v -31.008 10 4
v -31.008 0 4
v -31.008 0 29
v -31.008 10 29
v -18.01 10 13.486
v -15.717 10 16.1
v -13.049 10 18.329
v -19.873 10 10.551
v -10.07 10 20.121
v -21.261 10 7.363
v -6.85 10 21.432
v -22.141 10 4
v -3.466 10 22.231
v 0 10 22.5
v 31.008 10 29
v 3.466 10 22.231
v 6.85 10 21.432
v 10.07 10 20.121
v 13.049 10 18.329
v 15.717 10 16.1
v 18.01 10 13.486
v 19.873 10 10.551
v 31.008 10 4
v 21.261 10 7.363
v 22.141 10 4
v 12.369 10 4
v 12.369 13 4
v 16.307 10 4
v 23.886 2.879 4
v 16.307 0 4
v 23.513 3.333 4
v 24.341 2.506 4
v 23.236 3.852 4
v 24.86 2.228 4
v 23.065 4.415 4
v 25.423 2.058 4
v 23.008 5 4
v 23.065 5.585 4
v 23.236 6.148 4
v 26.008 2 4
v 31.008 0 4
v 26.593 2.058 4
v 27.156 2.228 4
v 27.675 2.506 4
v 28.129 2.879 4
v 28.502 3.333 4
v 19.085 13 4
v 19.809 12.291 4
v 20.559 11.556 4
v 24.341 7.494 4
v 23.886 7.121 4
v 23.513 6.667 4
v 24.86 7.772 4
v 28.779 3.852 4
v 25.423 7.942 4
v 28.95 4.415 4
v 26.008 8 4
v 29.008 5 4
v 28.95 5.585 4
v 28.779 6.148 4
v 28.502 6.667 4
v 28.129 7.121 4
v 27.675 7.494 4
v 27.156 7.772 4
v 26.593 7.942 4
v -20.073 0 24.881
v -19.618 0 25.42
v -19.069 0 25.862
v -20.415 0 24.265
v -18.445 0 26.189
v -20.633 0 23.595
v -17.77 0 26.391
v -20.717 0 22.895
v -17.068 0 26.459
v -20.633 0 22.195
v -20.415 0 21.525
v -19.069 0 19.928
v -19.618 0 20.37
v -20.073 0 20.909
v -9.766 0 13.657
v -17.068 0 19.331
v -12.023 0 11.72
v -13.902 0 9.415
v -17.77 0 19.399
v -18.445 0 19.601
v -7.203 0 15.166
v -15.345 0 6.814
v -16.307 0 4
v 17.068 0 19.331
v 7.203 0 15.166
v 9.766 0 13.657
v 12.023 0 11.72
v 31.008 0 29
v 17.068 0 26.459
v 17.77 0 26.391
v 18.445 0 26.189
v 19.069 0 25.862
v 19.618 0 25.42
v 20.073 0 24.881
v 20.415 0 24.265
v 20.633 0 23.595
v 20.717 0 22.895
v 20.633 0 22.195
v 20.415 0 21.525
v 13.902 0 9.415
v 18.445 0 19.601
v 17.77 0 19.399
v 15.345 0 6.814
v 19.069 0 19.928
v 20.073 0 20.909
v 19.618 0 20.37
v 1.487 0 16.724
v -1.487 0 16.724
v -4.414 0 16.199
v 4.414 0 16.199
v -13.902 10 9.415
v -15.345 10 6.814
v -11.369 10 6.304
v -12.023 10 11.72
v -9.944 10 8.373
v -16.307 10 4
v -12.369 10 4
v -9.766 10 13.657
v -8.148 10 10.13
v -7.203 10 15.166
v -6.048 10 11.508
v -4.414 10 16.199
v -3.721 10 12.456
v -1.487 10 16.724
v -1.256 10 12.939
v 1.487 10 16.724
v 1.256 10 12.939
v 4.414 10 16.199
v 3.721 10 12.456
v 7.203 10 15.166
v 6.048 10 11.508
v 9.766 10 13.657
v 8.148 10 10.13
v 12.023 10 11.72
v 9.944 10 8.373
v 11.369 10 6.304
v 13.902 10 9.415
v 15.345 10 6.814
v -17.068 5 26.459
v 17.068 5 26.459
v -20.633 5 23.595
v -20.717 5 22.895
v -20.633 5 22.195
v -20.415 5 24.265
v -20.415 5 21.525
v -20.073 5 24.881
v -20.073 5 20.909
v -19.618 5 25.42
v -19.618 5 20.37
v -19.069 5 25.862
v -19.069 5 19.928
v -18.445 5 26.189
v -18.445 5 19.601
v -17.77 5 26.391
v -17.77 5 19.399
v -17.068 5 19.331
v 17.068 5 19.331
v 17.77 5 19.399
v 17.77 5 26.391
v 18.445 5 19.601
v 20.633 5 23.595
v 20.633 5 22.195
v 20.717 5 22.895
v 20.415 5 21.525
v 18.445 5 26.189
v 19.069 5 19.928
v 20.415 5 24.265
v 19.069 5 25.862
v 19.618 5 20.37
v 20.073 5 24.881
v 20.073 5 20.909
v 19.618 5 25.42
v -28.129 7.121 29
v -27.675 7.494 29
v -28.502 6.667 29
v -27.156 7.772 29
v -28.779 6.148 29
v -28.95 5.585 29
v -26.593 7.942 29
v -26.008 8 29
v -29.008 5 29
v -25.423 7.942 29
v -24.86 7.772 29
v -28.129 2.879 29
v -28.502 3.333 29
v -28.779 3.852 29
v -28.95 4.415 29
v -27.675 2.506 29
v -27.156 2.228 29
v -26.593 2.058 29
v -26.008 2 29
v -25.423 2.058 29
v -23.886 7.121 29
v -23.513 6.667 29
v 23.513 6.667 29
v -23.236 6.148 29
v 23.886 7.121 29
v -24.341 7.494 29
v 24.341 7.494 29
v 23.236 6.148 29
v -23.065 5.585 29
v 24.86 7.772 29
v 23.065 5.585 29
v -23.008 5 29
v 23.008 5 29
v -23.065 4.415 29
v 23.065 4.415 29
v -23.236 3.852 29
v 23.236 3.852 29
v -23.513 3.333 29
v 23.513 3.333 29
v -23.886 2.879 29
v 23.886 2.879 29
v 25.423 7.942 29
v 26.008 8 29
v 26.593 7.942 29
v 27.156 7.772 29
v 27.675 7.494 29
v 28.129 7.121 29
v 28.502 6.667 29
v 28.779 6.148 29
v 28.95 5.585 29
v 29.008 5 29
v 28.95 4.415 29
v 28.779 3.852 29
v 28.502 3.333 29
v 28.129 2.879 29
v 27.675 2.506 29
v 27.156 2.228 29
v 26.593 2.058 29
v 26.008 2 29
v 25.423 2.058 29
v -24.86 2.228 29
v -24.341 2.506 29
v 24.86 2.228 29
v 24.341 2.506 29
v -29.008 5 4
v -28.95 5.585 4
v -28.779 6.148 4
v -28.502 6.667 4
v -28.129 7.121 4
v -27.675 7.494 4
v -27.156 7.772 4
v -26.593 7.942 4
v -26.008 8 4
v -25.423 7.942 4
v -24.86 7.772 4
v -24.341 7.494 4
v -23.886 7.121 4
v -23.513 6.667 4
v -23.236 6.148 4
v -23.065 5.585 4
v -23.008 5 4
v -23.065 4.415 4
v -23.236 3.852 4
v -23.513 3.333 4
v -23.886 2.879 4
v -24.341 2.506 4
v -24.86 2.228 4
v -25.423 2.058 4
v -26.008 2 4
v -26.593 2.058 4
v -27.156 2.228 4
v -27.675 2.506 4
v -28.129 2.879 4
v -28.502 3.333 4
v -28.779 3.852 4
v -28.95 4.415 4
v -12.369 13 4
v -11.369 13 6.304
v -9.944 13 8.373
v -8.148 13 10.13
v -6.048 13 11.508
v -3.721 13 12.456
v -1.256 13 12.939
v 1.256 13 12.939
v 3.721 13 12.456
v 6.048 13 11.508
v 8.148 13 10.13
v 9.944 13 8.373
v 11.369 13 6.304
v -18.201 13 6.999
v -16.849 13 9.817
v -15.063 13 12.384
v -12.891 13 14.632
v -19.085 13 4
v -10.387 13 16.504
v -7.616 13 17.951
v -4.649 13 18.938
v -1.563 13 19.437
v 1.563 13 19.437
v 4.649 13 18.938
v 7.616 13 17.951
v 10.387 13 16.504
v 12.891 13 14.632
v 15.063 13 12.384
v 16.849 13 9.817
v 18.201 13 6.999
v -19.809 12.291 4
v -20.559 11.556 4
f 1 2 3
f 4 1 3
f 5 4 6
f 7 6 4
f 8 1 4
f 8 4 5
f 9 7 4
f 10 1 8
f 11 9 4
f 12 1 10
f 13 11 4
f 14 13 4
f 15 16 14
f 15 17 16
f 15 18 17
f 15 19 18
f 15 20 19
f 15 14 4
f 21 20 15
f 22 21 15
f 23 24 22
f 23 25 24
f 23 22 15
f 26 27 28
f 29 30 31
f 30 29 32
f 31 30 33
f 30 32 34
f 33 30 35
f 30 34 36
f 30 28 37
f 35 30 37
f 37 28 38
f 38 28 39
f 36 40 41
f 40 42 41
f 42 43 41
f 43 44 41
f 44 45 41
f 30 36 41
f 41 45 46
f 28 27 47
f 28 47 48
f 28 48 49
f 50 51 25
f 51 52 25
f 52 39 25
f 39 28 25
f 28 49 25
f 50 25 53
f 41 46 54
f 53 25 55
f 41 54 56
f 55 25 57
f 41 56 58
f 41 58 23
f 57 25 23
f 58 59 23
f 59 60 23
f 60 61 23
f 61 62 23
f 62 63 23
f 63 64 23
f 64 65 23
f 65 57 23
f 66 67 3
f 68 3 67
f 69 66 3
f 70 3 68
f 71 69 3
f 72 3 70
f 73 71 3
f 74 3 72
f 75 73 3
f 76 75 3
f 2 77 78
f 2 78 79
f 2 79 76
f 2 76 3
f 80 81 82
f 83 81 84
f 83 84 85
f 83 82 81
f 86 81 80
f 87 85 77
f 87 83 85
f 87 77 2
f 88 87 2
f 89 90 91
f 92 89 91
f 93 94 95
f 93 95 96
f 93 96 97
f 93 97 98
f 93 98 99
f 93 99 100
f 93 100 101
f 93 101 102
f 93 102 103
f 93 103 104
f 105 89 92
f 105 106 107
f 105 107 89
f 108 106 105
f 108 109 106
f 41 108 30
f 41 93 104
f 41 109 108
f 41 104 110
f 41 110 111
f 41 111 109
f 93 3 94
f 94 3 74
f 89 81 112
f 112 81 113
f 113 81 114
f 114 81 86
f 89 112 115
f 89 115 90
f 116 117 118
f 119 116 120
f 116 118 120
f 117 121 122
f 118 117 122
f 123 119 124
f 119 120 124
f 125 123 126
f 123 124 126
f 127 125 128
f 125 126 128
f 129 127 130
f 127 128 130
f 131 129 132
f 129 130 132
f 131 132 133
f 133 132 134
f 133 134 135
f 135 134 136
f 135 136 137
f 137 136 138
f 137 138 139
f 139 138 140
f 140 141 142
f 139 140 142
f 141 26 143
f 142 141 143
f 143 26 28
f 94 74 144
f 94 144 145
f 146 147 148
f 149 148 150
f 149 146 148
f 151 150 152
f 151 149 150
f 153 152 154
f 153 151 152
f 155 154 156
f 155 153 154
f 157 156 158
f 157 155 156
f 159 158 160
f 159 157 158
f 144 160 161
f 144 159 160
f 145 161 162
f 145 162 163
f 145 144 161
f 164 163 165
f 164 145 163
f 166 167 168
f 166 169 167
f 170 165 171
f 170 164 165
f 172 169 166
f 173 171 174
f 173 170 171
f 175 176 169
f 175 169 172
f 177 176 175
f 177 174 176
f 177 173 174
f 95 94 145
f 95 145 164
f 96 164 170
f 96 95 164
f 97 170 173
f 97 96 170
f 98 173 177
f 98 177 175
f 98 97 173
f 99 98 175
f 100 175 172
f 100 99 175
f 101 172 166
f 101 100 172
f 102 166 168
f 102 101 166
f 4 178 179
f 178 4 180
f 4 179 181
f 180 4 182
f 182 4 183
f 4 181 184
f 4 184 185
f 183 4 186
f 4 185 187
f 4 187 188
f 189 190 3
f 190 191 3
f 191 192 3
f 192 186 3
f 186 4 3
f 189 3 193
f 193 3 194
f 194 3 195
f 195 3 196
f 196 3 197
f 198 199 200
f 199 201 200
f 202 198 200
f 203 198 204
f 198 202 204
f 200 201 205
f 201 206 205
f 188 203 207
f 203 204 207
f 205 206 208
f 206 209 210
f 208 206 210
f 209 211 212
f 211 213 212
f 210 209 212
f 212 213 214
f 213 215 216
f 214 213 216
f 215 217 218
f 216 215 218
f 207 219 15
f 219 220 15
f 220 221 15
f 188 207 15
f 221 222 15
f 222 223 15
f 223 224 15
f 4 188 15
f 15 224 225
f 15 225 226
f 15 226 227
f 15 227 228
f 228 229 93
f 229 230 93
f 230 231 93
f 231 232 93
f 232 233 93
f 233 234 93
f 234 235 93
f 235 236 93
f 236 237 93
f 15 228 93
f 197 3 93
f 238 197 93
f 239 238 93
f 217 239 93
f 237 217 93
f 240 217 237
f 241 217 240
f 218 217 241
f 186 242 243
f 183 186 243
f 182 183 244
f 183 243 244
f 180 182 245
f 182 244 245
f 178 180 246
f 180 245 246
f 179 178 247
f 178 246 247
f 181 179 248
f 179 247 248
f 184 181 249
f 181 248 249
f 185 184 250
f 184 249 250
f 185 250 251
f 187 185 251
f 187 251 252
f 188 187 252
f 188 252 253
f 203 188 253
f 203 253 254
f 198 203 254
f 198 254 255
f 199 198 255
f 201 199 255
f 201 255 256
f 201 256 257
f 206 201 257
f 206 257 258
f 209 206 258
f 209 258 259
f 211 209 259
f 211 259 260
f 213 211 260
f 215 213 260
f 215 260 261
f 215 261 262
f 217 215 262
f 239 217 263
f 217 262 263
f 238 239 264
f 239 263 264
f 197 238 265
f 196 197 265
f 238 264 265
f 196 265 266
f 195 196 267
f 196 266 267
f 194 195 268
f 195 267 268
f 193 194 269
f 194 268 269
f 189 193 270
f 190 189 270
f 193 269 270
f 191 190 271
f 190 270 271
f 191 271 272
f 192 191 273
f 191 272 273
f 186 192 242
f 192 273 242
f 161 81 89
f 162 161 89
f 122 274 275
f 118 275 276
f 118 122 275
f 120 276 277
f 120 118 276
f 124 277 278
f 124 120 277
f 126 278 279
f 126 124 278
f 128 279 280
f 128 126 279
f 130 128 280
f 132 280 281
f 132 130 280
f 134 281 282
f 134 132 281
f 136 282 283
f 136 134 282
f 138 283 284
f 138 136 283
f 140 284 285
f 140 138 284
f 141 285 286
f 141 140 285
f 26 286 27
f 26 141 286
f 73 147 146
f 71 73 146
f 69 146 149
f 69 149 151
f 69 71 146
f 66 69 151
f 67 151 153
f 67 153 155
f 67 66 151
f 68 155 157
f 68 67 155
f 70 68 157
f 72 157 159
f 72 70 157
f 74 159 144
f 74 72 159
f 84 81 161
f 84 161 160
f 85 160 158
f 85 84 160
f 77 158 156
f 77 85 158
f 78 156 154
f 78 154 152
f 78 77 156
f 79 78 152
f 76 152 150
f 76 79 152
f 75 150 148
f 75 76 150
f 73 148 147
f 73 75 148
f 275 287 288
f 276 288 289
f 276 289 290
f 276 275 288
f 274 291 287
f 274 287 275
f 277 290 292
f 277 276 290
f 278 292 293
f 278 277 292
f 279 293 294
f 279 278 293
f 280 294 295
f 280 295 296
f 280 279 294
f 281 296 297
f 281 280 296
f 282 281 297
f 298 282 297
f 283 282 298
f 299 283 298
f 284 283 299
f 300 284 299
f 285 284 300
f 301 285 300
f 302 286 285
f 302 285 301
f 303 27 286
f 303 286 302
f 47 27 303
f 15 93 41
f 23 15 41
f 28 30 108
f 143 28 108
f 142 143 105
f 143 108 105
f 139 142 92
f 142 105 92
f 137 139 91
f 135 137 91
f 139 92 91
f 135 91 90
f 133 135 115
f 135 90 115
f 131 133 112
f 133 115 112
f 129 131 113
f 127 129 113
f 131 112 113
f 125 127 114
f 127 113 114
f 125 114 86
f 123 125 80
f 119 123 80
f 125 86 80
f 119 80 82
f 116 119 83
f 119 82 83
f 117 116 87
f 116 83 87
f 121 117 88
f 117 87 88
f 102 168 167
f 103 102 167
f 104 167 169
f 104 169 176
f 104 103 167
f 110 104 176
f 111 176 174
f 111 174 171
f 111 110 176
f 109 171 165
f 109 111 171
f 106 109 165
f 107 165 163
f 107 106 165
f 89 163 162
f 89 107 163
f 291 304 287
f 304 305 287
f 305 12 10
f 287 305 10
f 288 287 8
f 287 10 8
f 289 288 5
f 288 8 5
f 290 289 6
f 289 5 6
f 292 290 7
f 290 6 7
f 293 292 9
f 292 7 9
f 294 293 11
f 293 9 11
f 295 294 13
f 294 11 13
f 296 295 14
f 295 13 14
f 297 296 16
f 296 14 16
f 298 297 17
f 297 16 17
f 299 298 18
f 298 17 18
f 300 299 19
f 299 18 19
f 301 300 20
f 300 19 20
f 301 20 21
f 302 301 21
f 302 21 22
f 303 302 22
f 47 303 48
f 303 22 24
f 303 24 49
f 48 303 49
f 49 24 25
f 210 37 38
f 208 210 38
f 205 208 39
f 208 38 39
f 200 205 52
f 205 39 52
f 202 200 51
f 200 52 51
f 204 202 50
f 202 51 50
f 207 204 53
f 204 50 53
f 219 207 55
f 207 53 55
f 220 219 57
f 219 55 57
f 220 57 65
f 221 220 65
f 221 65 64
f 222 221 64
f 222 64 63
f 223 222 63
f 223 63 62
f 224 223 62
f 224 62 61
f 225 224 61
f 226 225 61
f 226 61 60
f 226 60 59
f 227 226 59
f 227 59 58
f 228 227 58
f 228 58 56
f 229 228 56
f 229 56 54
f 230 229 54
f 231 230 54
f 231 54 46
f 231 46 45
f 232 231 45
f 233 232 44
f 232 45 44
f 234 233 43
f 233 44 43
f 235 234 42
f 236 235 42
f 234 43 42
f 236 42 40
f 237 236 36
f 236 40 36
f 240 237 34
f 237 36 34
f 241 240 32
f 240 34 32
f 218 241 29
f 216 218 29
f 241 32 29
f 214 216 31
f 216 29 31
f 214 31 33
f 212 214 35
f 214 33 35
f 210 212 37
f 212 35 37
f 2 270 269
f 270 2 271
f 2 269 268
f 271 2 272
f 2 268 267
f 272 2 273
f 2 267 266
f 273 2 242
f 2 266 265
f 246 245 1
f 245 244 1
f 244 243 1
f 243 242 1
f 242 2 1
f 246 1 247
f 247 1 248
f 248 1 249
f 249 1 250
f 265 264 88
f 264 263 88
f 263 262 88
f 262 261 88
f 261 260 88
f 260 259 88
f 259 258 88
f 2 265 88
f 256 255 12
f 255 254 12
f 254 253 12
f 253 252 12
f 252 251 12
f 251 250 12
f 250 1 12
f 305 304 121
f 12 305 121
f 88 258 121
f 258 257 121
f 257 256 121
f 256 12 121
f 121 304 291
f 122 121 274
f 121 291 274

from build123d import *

# Parameters (mm, degrees)
BOSS_EXTRUDE1_DEPTH = 10
SKETCH2_R           = 3
CUT_EXTRUDE1_DEPTH  = 27
SKETCH4_R           = 19.5
SKETCH4_R_2         = 13
BOSS_EXTRUDE2_DEPTH = 3
CUT_EXTRUDE2_DEPTH  = 8
CHAMFER1_SIZE       = 3
SKETCH6_W           = 41.436134758
SKETCH6_H           = 7.128250764
CUT_EXTRUDE3_DEPTH  = 5
FILLET1_R           = 3.65


# Some blends are built 0.0001 mm under size
with BuildPart() as part:
    # Sketch1 → Boss-Extrude1 (new body)
    with BuildSketch(Plane(origin=(0, 0, 0), x_dir=(1, 0, 0), z_dir=(0, 1, 0))):
        with BuildLine():
            Line((-16.306566162, -4), (-31.007810594, -4))
            Line((-31.007810594, -4), (-31.007810594, -29))
            Line((-31.007810594, -29), (-22, -29))
            Line((-22, -29), (22, -29))
            Line((22, -29), (31.007810594, -29))
            Line((31.007810594, -29), (31.007810594, -4))
            Line((31.007810594, -4), (16.306566162, -4))
            ThreePointArc((16.306566162, -4), (0, -16.79), (-16.306566162, -4))
        make_face()
    extrude(amount=BOSS_EXTRUDE1_DEPTH)

    # Sketch2 → Cut-Extrude1 (cut)
    with BuildSketch(Plane(origin=(0, 0, 4), x_dir=(-1, 0, 0), z_dir=(0, 0, -1))):
        with Locations((-26.007810594, 5)):
            Circle(SKETCH2_R)
        with Locations((26.007810594, 5)):
            Circle(SKETCH2_R)
    extrude(amount=-CUT_EXTRUDE1_DEPTH, mode=Mode.SUBTRACT)

    # Sketch4 → Boss-Extrude2 (add)
    with BuildSketch(Plane(origin=(0, 10, 0), x_dir=(1, 0, 0), z_dir=(0, 1, 0))):
        with Locations(Location((0, 0, 0), (0, 0, 348.162995844))):
            Circle(SKETCH4_R)
        with Locations(Location((0, 0, 0), (0, 0, 270))):
            Circle(SKETCH4_R_2, mode=Mode.SUBTRACT)
    extrude(amount=BOSS_EXTRUDE2_DEPTH)

    # Sketch5 → Cut-Extrude2 (cut)
    with BuildSketch(Plane(origin=(0, 13, 0), x_dir=(1, 0, 0), z_dir=(0, 1, 0))):
        Polygon((-19.085334684, -4), (-23.625672229, -4), (-23.625672229, 24.113520256), (25.409917146, 24.113520256), (25.409917146, -4), align=None)
    extrude(amount=-CUT_EXTRUDE2_DEPTH, mode=Mode.SUBTRACT)

    # Chamfer1
    chamfer1_edges = [part.edges().sort_by_distance(p)[0] for p in [
        (0, 10, 19.5),
    ]]
    chamfer(chamfer1_edges, length=CHAMFER1_SIZE - 0.0001)  # a hair under: the kernel refuses the full size

    # Sketch6 → Cut-Extrude3 (cut)
    with BuildSketch(Plane.XZ):
        with Locations((0, 22.895)):
            Rectangle(SKETCH6_W, SKETCH6_H)
    extrude(amount=-CUT_EXTRUDE3_DEPTH, mode=Mode.SUBTRACT)

    # Fillet1
    # the kernel refuses this fillet: 3.65 mm, written as the material it adds along each edge
    with BuildSketch(Plane(origin=(-20.718067379, 0, 19.330874618), x_dir=(0, 0, 1), z_dir=(0, 1, 0))) as fillet1_piece_1:
        with BuildLine():
            CenterArc((FILLET1_R, FILLET1_R), FILLET1_R, 180, 90)
            Line((0, FILLET1_R), (0, 0))
            Line((0, 0), (FILLET1_R, 0))
        make_face()
    extrude(amount=5)
    with BuildSketch(Plane(origin=(-20.718067379, 0, 26.459125382), x_dir=(0, 0, -1), z_dir=(0, 1, 0)), Plane(origin=(20.718067379, 0, 26.459125382), x_dir=(-1, 0, 0), z_dir=(0, 1, 0)), Plane(origin=(20.718067379, 0, 19.330874618), x_dir=(0, 0, 1), z_dir=(0, 1, 0))) as fillet1_piece_2:
        with BuildLine():
            CenterArc((FILLET1_R, -FILLET1_R), FILLET1_R, 90, 90)
            Line((0, -FILLET1_R), (0, 0))
            Line((0, 0), (FILLET1_R, 0))
        make_face()
    extrude(amount=5)


solid = part.part
